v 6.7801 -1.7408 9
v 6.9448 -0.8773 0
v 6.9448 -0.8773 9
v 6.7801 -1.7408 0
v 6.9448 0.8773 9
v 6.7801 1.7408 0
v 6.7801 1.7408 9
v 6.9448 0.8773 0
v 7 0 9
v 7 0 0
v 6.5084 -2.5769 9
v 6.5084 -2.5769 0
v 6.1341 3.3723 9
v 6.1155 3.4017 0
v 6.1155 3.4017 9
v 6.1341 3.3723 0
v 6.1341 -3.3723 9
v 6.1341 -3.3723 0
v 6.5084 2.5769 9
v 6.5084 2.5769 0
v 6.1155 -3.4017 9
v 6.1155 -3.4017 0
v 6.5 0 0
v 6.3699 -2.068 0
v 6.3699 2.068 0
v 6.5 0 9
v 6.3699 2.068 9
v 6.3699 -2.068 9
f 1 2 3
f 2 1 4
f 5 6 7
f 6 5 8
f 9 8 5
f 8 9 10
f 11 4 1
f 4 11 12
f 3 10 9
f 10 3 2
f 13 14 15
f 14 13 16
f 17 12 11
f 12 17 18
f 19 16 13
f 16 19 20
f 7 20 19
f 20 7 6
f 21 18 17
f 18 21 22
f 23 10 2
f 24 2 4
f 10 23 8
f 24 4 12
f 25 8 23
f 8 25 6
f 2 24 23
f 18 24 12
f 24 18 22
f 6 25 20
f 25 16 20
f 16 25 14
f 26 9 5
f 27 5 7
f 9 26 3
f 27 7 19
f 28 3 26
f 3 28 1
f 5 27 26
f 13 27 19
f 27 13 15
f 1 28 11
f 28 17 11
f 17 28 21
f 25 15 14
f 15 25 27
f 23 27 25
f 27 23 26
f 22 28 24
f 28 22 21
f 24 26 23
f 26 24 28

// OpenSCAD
$fn = 50;


difference() {
	union() {
		cylinder(h = 9, r = 7.0000000000);
		translate(v = [-13.0000000000, 0, 0]) {
			cylinder(h = 9, r = 7.0000000000);
		}
	}
	union() {
		cylinder(h = 9, r = 3.2500000000);
		cylinder(h = 9, r = 1.8000000000);
		cylinder(h = 9, r = 1.8000000000);
		cylinder(h = 9, r = 1.8000000000);
		translate(v = [-17.5000000000, 0, 0]) {
			hull() {
				translate(v = [-3.7500000000, 0.0000000000, 0]) {
					cylinder(h = 9, r = 10.5000000000);
				}
				translate(v = [3.7500000000, 0.0000000000, 0]) {
					cylinder(h = 9, r = 10.5000000000);
				}
				translate(v = [-3.7500000000, -0.0000000000, 0]) {
					cylinder(h = 9, r = 10.5000000000);
				}
				translate(v = [3.7500000000, -0.0000000000, 0]) {
					cylinder(h = 9, r = 10.5000000000);
				}
			}
		}
		translate(v = [-10.0000000000, 0, 0.0000000000]) {
			cylinder(h = 9, r = 16.5000000000);
		}
	}
}
